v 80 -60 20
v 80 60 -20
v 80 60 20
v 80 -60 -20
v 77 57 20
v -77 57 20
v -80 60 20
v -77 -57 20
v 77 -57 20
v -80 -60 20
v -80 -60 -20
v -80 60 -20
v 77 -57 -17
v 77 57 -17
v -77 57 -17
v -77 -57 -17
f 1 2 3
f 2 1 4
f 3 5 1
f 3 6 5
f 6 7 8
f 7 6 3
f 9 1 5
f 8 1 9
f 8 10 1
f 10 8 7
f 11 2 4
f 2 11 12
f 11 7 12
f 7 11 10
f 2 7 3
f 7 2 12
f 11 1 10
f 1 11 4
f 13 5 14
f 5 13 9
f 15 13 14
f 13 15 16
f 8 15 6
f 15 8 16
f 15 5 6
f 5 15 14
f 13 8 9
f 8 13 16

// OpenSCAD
// ========================================
// a 160 x 120 x 40 mm enclosure with 3 mm wall thickness
// NeuroCAD canonical IR; dimensions are millimetres
// ========================================
$fn = 48;

difference() {
  cube(size=[160, 120, 40], center=true);
  translate([0, 0, 1.6]) {
    cube(size=[154, 114, 37.2], center=true);
  }
}
